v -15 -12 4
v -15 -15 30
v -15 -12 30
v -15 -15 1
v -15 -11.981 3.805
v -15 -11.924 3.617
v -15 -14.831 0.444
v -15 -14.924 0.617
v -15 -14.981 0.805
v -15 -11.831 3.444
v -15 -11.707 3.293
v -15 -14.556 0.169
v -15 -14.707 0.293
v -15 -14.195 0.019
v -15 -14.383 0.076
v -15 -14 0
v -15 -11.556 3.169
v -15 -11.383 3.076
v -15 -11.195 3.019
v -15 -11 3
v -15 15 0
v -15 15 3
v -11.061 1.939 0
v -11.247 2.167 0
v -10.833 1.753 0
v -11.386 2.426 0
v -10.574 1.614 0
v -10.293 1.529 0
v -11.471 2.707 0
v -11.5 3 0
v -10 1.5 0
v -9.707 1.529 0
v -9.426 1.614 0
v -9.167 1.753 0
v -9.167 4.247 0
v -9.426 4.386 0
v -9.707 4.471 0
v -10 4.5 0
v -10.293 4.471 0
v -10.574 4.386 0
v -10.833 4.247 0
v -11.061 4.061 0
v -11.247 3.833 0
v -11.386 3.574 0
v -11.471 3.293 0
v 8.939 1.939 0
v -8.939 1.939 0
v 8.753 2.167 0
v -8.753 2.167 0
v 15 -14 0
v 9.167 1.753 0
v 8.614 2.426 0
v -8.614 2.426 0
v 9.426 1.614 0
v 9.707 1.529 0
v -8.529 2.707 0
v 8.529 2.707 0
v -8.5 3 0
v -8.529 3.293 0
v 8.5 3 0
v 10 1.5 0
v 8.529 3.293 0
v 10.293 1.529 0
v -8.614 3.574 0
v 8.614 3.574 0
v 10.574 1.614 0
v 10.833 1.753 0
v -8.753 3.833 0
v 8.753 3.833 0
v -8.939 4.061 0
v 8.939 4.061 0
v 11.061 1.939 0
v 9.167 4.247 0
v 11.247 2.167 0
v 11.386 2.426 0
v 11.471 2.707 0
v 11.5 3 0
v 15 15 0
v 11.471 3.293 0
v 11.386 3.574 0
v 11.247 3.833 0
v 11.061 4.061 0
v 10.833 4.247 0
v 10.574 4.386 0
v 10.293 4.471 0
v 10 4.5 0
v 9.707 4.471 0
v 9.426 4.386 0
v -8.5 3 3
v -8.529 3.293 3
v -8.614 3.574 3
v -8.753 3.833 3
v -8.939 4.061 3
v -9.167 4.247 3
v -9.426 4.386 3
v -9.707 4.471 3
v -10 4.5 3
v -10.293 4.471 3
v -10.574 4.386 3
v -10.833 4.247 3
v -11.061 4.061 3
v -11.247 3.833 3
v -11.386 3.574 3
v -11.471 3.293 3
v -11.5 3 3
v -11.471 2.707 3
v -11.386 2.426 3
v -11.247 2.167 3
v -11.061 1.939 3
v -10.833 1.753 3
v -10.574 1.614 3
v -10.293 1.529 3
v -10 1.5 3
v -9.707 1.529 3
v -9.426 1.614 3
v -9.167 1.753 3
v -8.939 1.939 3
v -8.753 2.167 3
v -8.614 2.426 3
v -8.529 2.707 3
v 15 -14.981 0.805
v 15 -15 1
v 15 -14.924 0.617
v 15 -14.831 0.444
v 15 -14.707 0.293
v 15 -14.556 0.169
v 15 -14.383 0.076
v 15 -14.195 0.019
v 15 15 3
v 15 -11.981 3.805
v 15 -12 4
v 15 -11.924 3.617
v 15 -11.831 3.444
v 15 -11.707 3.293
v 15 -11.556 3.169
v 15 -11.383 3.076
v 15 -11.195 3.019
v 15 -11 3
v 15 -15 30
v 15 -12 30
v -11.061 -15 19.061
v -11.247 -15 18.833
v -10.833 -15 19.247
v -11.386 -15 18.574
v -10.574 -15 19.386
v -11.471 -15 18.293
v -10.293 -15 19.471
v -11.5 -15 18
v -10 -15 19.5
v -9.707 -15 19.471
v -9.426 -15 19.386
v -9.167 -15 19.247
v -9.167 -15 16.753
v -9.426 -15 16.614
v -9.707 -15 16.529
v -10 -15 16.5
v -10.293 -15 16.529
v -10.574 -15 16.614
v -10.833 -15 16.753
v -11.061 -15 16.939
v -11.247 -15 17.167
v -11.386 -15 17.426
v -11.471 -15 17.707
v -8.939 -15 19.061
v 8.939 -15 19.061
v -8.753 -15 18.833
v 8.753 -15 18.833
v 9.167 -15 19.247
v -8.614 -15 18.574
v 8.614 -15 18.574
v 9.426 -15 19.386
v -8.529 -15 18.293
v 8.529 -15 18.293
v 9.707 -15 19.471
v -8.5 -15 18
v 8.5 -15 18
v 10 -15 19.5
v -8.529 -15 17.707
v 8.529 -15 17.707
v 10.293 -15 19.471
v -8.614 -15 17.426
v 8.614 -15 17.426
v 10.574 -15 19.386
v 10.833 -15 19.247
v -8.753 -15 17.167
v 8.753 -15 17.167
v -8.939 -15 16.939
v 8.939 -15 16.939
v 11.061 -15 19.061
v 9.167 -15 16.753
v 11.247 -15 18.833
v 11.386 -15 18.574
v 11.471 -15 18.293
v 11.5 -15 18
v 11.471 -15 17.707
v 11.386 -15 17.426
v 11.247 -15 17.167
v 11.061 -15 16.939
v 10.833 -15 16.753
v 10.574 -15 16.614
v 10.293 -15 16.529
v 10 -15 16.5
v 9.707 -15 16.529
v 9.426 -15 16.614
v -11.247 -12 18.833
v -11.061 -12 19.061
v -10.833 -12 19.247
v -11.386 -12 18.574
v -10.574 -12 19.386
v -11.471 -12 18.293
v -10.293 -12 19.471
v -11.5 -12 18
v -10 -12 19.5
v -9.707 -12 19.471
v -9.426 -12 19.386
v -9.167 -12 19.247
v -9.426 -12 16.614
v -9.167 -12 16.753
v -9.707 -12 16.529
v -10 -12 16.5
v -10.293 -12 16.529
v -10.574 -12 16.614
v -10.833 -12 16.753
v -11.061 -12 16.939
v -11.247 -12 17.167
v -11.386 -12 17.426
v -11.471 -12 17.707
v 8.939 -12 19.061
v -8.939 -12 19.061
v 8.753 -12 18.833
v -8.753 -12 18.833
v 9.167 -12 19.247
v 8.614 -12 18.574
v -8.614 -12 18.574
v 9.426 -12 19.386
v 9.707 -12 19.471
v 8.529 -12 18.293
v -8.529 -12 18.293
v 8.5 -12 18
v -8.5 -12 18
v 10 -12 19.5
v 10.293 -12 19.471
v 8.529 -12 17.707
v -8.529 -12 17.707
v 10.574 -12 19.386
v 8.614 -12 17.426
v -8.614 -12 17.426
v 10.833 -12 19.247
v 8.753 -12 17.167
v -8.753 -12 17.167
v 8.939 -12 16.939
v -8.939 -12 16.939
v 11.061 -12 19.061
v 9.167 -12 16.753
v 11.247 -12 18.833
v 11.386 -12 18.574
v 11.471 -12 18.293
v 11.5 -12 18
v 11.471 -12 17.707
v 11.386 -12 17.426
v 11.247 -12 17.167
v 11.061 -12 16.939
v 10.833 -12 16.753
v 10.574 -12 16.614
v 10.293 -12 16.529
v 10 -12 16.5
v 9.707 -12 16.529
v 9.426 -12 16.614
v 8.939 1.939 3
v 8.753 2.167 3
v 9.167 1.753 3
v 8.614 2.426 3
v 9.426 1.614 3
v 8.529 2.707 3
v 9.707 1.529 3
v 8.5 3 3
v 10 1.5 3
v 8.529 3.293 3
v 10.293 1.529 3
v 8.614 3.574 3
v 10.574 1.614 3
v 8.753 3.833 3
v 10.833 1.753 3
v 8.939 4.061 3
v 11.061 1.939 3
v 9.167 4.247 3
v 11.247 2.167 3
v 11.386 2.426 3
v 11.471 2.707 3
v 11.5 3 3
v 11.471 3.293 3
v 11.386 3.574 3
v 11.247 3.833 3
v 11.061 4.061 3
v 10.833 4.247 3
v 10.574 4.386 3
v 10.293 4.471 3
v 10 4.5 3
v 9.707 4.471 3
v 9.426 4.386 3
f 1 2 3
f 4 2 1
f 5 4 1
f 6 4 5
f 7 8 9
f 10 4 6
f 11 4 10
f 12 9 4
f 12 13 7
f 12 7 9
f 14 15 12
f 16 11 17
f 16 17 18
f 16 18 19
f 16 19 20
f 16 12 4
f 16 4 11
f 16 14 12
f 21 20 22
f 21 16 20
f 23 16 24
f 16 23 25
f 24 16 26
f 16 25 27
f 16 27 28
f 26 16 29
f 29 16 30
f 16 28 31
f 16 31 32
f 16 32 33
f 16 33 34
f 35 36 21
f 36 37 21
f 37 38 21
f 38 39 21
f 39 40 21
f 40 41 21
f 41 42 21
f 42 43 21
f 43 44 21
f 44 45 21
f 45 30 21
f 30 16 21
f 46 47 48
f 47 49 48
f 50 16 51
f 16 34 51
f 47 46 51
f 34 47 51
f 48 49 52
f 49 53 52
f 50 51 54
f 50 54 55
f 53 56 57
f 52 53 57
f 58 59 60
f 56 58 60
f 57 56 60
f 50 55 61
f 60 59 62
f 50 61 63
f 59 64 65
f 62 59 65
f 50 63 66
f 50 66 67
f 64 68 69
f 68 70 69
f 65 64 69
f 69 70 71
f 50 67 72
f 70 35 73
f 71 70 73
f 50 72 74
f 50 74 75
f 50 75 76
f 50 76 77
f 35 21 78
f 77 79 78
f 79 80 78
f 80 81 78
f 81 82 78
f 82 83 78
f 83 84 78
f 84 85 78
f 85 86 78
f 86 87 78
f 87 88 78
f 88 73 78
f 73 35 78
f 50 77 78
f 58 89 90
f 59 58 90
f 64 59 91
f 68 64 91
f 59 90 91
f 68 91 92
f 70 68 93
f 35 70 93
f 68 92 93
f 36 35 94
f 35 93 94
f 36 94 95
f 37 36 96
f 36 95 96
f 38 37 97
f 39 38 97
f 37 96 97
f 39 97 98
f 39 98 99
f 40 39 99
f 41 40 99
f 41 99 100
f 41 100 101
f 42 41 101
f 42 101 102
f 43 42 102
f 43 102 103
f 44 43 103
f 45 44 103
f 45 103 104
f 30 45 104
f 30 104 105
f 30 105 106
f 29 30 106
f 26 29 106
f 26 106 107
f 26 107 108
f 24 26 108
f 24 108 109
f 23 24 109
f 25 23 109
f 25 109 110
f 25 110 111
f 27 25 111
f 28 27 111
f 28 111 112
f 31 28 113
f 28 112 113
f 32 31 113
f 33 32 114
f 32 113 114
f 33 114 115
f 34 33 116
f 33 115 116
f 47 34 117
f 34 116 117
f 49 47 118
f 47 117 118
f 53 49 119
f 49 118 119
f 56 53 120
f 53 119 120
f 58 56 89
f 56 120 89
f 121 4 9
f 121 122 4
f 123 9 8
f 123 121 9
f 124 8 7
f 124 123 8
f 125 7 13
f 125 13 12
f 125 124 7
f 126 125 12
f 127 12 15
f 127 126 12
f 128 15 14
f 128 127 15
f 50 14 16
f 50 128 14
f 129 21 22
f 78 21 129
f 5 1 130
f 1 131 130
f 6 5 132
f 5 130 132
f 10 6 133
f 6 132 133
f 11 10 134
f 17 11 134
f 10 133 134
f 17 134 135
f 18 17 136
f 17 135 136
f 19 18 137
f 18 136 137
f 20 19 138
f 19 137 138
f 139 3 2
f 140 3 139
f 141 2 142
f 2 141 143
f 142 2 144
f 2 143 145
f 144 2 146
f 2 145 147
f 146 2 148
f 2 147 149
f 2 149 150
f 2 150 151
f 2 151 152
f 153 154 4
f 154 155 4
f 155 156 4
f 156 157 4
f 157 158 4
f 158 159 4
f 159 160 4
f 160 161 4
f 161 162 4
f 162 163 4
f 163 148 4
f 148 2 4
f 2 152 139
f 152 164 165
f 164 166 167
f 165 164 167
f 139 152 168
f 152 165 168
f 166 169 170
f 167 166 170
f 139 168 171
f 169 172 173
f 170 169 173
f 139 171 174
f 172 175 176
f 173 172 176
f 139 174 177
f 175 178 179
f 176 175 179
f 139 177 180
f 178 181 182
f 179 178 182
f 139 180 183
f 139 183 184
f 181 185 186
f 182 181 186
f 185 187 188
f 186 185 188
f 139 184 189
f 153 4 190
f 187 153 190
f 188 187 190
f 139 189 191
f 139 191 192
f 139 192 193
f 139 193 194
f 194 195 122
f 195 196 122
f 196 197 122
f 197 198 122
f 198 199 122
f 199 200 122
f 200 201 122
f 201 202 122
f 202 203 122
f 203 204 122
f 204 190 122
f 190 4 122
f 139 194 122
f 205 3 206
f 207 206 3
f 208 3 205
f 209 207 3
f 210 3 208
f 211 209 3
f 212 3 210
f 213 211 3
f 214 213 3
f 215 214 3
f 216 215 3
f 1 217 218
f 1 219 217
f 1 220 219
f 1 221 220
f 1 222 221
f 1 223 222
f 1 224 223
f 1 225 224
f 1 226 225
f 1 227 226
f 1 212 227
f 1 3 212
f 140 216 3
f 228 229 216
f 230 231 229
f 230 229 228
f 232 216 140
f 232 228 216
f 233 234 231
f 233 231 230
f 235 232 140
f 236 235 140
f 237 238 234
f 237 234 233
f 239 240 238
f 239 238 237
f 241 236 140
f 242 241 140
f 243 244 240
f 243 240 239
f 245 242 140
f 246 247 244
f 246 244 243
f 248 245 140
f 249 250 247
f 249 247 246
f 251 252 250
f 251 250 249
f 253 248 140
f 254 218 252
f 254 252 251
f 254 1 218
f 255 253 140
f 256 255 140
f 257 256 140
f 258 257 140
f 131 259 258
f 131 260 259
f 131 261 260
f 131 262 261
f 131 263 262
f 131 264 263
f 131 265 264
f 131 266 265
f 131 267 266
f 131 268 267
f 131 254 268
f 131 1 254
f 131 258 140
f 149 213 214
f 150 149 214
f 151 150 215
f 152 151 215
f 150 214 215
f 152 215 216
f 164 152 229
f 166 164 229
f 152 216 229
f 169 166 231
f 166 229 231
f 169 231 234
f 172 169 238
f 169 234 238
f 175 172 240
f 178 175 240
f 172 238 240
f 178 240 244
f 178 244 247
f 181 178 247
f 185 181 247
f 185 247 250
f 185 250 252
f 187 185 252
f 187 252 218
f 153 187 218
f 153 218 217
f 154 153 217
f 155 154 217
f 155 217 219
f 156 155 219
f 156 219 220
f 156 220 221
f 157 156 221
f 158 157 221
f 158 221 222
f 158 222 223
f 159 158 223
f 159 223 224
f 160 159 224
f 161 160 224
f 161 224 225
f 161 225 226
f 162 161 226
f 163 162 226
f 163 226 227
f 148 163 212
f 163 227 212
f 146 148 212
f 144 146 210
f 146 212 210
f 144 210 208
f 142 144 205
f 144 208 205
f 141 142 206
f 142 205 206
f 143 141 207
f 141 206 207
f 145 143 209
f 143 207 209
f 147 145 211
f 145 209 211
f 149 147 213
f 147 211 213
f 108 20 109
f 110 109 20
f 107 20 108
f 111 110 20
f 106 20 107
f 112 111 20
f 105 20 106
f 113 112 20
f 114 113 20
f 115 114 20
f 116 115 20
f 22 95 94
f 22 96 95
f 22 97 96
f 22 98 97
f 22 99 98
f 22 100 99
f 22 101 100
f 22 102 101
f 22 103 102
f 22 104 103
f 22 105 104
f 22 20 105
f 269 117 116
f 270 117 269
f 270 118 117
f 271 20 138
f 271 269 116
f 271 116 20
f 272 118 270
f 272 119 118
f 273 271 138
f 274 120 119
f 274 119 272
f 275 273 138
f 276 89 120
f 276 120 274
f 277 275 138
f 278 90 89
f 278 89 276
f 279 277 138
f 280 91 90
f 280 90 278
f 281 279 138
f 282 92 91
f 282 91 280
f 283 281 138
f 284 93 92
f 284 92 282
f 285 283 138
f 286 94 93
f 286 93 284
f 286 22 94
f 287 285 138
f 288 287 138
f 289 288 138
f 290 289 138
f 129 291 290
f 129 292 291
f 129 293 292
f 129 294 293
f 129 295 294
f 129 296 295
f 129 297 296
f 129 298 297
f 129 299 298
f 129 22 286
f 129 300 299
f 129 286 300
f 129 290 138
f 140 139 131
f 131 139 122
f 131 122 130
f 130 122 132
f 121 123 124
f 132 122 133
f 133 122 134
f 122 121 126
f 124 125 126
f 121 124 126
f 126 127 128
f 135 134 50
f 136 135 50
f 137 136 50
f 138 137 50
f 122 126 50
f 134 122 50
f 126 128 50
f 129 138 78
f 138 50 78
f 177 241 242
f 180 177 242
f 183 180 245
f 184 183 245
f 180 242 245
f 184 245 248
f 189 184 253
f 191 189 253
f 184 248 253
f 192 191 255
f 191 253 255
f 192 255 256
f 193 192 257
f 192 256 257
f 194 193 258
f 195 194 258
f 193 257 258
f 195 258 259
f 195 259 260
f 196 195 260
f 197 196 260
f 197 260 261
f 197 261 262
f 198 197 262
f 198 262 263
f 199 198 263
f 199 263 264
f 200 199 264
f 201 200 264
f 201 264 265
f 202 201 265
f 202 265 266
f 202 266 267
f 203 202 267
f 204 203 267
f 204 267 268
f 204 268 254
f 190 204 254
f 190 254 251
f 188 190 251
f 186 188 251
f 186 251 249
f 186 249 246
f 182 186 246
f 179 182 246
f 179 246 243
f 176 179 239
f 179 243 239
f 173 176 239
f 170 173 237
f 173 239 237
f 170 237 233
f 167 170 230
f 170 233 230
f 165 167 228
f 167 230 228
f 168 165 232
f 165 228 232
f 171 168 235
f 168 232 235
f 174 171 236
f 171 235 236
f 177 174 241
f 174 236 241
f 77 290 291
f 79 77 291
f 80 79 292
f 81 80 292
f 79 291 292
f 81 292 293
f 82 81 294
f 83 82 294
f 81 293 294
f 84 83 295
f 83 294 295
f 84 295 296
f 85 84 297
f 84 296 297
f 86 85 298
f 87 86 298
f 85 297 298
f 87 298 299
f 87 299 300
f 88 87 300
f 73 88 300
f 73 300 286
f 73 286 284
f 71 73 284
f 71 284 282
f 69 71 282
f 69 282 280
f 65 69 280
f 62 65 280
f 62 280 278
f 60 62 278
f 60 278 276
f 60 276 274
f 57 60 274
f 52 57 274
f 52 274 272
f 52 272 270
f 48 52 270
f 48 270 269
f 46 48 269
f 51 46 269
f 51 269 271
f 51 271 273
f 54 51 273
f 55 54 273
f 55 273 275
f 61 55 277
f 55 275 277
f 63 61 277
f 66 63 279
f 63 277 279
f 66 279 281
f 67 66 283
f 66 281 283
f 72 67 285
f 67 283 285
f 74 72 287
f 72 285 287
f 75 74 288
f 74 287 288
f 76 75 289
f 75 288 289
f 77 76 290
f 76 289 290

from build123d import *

# Parameters (mm, degrees)
SKETCH_1_W          = 30
SKETCH_1_H          = 30
EXTRUDE_1_DEPTH     = 3
SKETCH_2_R          = 1.5
CUT_EXTRUDE_1_DEPTH = 3.5
SKETCH_3_W          = 30
SKETCH_3_H          = 3
EXTRUDE_2_DEPTH     = 27
SKETCH_4_R          = 1.5
CUT_EXTRUDE_2_DEPTH = 27
FILLET_1_R          = 1
FILLET_2_R          = 1


with BuildPart() as part:
    # 草图1 → 凸台-拉伸1 (new body)
    with BuildSketch(Plane.XY):
        Rectangle(SKETCH_1_W, SKETCH_1_H)
    extrude(amount=EXTRUDE_1_DEPTH)

    # 草图2 → 切除-拉伸1 (cut)
    with BuildSketch(Plane.XY.offset(3)):
        with Locations((10, 3)):
            Circle(SKETCH_2_R)
        with Locations((-10, 3)):
            Circle(SKETCH_2_R)
    extrude(amount=-CUT_EXTRUDE_1_DEPTH, mode=Mode.SUBTRACT)

    # 草图3 → 凸台-拉伸2 (add)
    with BuildSketch(Plane.XY.offset(3)):
        with Locations((0, -13.5)):
            Rectangle(SKETCH_3_W, SKETCH_3_H)
    extrude(amount=EXTRUDE_2_DEPTH)

    # 草图4 → 切除-拉伸2 (cut)
    with BuildSketch(Plane(origin=(0, -12, 0), x_dir=(1, 0, 0), z_dir=(0, 1, 0))):
        with Locations(Location((10, -18, 0), (0, 0, 270))):
            Circle(SKETCH_4_R)
        with Locations(Location((-10, -18, 0), (0, 0, 270))):
            Circle(SKETCH_4_R)
    extrude(amount=-CUT_EXTRUDE_2_DEPTH, mode=Mode.SUBTRACT)

    # 圆角1
    fillet_1_edges = [part.edges().sort_by_distance(p)[0] for p in [
        (0, -12, 3),
    ]]
    fillet(fillet_1_edges, radius=FILLET_1_R)

    # 圆角2
    fillet_2_edges = [part.edges().sort_by_distance(p)[0] for p in [
        (0, -15, 0),
    ]]
    fillet(fillet_2_edges, radius=FILLET_2_R)


solid = part.part
